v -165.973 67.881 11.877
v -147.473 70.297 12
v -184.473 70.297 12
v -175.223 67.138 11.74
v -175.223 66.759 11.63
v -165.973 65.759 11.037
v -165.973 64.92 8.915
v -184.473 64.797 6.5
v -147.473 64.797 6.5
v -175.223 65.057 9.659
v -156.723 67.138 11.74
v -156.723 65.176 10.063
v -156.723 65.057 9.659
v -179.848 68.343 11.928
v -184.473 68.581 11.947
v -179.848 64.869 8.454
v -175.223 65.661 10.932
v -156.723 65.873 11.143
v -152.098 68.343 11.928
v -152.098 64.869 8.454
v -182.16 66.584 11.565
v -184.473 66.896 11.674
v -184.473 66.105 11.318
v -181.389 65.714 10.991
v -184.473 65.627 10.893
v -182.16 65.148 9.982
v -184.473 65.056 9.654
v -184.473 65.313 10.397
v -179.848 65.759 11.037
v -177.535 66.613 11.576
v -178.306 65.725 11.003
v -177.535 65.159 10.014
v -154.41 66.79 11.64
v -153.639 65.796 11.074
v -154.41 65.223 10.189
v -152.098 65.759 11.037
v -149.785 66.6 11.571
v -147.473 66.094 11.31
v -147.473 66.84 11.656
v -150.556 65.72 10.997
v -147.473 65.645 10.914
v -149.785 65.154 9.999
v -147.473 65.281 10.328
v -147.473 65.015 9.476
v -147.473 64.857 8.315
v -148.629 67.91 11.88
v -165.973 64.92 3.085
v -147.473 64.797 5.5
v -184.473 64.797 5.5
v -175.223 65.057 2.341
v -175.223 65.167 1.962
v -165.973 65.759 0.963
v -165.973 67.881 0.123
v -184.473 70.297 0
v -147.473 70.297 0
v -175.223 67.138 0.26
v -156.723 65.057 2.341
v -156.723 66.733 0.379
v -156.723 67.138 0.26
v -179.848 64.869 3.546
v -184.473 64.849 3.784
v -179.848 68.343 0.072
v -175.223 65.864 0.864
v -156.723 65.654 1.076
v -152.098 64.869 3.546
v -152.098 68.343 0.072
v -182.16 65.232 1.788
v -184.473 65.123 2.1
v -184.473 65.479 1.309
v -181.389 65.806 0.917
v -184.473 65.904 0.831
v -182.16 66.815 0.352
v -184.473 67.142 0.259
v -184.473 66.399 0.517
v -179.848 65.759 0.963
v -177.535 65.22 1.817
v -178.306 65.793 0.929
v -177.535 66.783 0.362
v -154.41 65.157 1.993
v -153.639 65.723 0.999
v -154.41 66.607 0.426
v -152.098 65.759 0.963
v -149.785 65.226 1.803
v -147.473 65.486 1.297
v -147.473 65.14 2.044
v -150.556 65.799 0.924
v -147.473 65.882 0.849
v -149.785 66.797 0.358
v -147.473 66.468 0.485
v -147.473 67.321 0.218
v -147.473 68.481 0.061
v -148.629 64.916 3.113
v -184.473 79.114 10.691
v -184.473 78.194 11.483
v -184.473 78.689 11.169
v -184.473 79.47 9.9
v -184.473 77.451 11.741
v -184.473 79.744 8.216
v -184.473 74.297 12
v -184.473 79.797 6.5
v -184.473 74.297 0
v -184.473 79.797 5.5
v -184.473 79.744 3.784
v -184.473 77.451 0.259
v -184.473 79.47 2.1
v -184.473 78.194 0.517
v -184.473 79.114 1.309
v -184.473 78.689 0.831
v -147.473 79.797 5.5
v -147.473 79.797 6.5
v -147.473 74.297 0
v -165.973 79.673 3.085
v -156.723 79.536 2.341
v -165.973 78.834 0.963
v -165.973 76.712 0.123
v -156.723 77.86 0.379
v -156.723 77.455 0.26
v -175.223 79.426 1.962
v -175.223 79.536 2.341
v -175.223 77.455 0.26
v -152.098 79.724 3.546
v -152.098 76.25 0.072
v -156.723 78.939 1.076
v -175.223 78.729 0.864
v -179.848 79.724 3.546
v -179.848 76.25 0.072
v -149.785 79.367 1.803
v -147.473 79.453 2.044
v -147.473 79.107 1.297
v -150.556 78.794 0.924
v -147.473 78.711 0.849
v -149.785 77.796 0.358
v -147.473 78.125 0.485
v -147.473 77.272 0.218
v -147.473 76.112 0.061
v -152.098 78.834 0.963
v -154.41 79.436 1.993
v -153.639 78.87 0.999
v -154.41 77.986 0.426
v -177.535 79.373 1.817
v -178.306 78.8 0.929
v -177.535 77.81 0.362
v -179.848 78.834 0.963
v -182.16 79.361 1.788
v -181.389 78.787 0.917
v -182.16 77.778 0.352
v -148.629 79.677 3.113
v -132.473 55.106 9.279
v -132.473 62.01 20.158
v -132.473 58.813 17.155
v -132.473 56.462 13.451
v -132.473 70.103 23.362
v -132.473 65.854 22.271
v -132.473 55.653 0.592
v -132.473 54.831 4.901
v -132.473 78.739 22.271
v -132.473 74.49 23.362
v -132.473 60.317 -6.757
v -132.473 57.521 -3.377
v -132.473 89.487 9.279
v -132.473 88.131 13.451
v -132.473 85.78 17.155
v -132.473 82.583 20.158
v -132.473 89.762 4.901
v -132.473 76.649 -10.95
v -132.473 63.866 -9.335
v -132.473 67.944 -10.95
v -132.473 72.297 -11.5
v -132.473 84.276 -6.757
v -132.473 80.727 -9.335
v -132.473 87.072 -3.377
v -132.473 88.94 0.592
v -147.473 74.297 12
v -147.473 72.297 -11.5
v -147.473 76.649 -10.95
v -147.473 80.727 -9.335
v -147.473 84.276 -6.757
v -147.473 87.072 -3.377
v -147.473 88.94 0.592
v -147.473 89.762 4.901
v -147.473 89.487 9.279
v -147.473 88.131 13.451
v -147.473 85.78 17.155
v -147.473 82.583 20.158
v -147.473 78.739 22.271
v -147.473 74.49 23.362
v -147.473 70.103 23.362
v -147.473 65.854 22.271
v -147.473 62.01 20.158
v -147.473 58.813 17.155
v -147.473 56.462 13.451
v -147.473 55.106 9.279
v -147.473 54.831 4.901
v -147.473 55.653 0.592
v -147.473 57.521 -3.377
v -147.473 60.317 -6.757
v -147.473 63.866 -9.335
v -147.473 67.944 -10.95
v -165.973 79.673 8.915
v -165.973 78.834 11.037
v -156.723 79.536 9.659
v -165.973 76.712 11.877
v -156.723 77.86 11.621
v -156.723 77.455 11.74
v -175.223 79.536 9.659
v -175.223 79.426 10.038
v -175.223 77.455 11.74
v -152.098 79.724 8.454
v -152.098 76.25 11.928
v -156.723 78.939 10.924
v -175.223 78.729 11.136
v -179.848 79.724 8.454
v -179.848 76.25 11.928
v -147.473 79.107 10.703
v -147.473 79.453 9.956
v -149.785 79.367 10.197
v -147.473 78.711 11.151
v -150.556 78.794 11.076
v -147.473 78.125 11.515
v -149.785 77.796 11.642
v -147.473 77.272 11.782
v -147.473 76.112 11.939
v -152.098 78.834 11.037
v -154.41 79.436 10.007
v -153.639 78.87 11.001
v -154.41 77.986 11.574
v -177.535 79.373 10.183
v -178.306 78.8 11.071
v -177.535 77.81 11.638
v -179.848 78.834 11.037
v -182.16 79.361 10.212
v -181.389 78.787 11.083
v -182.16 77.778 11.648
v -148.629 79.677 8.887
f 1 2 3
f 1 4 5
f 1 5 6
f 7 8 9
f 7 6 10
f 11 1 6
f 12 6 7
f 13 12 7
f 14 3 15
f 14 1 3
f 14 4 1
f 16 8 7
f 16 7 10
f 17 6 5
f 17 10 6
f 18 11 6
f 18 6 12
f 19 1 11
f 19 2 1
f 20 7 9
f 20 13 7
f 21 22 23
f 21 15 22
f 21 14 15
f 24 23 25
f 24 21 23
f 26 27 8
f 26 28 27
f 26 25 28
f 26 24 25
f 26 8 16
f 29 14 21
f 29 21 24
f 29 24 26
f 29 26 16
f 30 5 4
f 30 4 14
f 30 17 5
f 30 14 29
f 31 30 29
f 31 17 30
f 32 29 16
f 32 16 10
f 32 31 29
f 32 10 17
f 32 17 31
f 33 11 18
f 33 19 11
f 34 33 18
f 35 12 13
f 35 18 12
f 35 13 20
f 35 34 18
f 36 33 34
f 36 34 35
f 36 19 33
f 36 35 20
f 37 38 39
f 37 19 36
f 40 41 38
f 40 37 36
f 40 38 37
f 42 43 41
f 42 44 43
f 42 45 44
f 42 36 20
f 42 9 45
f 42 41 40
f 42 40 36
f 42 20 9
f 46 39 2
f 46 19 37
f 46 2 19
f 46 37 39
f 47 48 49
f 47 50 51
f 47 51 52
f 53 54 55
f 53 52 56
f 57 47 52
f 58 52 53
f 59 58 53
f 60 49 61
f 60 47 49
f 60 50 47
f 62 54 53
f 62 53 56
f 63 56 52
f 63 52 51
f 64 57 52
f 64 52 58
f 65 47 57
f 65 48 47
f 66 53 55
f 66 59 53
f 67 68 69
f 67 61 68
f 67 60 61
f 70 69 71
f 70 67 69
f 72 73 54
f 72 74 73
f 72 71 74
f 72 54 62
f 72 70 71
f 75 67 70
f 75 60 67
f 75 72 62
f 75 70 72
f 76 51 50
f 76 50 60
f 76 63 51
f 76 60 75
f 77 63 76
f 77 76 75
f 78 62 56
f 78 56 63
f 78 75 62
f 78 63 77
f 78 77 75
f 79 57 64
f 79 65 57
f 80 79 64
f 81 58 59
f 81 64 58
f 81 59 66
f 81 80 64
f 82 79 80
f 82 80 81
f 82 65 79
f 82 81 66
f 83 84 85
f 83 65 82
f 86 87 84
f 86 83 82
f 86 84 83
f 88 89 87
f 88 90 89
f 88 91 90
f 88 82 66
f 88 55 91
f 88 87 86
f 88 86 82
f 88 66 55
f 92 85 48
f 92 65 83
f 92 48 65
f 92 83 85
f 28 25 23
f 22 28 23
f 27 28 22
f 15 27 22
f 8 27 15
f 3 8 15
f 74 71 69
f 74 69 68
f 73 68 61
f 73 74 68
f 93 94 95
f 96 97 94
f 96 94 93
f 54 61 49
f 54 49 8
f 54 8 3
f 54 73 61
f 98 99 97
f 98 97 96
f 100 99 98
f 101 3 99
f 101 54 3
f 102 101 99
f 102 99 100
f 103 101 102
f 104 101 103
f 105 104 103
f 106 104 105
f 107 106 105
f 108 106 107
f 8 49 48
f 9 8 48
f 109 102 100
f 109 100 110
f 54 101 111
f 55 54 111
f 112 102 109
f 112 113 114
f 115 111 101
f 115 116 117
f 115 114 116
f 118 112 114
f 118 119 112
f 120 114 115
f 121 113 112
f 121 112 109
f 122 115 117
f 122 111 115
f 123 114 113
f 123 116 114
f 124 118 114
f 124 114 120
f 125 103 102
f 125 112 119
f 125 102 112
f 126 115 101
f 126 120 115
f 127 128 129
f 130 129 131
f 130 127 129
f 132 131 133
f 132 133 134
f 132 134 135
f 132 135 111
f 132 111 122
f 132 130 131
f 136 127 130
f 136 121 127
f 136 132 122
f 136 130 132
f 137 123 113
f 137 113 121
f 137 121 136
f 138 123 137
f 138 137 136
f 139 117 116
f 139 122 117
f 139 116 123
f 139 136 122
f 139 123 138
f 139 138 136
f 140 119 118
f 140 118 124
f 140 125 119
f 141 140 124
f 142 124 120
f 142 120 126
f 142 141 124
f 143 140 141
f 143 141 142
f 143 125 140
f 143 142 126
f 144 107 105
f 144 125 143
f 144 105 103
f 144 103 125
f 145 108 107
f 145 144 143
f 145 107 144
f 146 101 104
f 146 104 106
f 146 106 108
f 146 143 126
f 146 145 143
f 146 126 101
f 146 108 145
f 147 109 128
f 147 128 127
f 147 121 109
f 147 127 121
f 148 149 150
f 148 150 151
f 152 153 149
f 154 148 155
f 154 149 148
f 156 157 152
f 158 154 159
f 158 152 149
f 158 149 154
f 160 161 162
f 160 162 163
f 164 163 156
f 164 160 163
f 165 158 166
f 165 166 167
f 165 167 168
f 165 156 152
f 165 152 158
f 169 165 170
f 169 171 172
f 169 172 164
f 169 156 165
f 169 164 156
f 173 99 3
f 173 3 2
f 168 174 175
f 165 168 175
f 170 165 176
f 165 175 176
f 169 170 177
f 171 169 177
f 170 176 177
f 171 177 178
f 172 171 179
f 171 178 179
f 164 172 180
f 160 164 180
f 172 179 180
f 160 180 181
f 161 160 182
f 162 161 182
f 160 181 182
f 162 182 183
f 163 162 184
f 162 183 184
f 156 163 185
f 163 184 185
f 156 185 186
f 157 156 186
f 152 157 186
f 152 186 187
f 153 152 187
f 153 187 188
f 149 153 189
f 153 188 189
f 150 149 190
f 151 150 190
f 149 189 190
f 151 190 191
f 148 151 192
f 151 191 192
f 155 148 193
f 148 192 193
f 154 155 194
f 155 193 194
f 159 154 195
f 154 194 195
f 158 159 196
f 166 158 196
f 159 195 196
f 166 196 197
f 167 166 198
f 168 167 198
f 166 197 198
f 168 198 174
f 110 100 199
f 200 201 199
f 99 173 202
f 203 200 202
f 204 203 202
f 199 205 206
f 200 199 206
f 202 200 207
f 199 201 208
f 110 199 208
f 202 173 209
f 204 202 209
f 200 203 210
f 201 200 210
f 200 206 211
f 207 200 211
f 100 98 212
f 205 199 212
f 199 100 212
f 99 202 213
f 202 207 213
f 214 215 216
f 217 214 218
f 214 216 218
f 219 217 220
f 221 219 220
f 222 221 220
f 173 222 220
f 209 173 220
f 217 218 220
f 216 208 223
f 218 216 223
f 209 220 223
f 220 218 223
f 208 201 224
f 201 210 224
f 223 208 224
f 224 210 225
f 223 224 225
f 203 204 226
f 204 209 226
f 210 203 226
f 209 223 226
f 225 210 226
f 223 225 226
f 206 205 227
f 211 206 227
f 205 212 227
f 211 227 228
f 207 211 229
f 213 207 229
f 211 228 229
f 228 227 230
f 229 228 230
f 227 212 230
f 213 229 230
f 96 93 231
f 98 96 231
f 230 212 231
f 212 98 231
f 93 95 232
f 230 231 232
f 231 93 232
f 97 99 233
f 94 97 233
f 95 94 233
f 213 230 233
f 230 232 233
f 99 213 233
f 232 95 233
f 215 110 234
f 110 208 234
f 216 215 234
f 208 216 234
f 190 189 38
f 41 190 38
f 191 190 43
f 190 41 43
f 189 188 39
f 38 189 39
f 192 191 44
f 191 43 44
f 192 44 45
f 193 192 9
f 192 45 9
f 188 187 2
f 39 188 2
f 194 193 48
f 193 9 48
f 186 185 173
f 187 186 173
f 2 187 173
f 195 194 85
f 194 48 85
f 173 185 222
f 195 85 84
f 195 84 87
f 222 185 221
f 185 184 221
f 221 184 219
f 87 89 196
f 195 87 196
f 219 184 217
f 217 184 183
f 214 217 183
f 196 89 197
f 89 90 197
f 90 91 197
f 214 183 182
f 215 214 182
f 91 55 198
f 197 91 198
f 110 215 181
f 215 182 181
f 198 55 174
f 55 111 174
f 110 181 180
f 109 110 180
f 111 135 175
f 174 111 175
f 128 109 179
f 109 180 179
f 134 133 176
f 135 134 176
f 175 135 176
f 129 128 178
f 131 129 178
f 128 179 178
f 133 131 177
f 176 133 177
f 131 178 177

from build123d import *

# Parameters (mm, degrees)
SKETCH2_W           = 37
SKETCH2_H           = 15
BOSS_EXTRUDE1_DEPTH = 12
SKETCH3_R           = 17.5
BOSS_EXTRUDE2_DEPTH = 15
FILLET1_SIZE        = 5.5


with BuildPart() as part:
    # Sketch2 → Boss-Extrude1 (new body)
    with BuildSketch(Plane.XY):
        with Locations((-165.97258371, 72.296511628)):
            Rectangle(SKETCH2_W, SKETCH2_H)
    extrude(amount=BOSS_EXTRUDE1_DEPTH)

    # Sketch3 → Boss-Extrude2 (add)
    with BuildSketch(Plane(origin=(-147.47258371, 0, 0), x_dir=(0, 0, -1), z_dir=(1, 0, 0))):
        with Locations((-6, 72.296511628)):
            Circle(SKETCH3_R)
    extrude(amount=BOSS_EXTRUDE2_DEPTH)

    # Fillet1
    # a fillet whose section is not a circle: 5.5 mm, written as the material it takes off along each edge
    with BuildSketch(Plane(origin=(-147.47258371, 64.796511628, 0), x_dir=(0, 0, 1), z_dir=(-1, 0, 0)), Plane(origin=(-147.47258371, 64.796511628, 12), x_dir=(0, 1, 0), z_dir=(-1, 0, 0)), Plane(origin=(-198.22258371, 79.796511628, 0), x_dir=(0, 0, 1), z_dir=(1, 0, 0))) as fillet1_piece_1:
        with BuildLine():
            Bezier((FILLET1_SIZE, 0), (0, 0), (0, FILLET1_SIZE), weights=[1, 1.857142857, 1])
            Line((0, FILLET1_SIZE), (0, 0))
            Line((0, 0), (FILLET1_SIZE, 0))
        make_face()
    extrude(amount=50.75, mode=Mode.SUBTRACT)
    with BuildSketch(Plane(origin=(-198.22258371, 79.796511628, 12), x_dir=(0, 0, -1), z_dir=(1, 0, 0))) as fillet1_piece_2:
        with BuildLine():
            Bezier((FILLET1_SIZE, 0), (0, 0), (0, -FILLET1_SIZE), weights=[1, 1.857142857, 1])
            Line((0, -FILLET1_SIZE), (0, 0))
            Line((0, 0), (FILLET1_SIZE, 0))
        make_face()
    extrude(amount=50.75, mode=Mode.SUBTRACT)


solid = part.part
